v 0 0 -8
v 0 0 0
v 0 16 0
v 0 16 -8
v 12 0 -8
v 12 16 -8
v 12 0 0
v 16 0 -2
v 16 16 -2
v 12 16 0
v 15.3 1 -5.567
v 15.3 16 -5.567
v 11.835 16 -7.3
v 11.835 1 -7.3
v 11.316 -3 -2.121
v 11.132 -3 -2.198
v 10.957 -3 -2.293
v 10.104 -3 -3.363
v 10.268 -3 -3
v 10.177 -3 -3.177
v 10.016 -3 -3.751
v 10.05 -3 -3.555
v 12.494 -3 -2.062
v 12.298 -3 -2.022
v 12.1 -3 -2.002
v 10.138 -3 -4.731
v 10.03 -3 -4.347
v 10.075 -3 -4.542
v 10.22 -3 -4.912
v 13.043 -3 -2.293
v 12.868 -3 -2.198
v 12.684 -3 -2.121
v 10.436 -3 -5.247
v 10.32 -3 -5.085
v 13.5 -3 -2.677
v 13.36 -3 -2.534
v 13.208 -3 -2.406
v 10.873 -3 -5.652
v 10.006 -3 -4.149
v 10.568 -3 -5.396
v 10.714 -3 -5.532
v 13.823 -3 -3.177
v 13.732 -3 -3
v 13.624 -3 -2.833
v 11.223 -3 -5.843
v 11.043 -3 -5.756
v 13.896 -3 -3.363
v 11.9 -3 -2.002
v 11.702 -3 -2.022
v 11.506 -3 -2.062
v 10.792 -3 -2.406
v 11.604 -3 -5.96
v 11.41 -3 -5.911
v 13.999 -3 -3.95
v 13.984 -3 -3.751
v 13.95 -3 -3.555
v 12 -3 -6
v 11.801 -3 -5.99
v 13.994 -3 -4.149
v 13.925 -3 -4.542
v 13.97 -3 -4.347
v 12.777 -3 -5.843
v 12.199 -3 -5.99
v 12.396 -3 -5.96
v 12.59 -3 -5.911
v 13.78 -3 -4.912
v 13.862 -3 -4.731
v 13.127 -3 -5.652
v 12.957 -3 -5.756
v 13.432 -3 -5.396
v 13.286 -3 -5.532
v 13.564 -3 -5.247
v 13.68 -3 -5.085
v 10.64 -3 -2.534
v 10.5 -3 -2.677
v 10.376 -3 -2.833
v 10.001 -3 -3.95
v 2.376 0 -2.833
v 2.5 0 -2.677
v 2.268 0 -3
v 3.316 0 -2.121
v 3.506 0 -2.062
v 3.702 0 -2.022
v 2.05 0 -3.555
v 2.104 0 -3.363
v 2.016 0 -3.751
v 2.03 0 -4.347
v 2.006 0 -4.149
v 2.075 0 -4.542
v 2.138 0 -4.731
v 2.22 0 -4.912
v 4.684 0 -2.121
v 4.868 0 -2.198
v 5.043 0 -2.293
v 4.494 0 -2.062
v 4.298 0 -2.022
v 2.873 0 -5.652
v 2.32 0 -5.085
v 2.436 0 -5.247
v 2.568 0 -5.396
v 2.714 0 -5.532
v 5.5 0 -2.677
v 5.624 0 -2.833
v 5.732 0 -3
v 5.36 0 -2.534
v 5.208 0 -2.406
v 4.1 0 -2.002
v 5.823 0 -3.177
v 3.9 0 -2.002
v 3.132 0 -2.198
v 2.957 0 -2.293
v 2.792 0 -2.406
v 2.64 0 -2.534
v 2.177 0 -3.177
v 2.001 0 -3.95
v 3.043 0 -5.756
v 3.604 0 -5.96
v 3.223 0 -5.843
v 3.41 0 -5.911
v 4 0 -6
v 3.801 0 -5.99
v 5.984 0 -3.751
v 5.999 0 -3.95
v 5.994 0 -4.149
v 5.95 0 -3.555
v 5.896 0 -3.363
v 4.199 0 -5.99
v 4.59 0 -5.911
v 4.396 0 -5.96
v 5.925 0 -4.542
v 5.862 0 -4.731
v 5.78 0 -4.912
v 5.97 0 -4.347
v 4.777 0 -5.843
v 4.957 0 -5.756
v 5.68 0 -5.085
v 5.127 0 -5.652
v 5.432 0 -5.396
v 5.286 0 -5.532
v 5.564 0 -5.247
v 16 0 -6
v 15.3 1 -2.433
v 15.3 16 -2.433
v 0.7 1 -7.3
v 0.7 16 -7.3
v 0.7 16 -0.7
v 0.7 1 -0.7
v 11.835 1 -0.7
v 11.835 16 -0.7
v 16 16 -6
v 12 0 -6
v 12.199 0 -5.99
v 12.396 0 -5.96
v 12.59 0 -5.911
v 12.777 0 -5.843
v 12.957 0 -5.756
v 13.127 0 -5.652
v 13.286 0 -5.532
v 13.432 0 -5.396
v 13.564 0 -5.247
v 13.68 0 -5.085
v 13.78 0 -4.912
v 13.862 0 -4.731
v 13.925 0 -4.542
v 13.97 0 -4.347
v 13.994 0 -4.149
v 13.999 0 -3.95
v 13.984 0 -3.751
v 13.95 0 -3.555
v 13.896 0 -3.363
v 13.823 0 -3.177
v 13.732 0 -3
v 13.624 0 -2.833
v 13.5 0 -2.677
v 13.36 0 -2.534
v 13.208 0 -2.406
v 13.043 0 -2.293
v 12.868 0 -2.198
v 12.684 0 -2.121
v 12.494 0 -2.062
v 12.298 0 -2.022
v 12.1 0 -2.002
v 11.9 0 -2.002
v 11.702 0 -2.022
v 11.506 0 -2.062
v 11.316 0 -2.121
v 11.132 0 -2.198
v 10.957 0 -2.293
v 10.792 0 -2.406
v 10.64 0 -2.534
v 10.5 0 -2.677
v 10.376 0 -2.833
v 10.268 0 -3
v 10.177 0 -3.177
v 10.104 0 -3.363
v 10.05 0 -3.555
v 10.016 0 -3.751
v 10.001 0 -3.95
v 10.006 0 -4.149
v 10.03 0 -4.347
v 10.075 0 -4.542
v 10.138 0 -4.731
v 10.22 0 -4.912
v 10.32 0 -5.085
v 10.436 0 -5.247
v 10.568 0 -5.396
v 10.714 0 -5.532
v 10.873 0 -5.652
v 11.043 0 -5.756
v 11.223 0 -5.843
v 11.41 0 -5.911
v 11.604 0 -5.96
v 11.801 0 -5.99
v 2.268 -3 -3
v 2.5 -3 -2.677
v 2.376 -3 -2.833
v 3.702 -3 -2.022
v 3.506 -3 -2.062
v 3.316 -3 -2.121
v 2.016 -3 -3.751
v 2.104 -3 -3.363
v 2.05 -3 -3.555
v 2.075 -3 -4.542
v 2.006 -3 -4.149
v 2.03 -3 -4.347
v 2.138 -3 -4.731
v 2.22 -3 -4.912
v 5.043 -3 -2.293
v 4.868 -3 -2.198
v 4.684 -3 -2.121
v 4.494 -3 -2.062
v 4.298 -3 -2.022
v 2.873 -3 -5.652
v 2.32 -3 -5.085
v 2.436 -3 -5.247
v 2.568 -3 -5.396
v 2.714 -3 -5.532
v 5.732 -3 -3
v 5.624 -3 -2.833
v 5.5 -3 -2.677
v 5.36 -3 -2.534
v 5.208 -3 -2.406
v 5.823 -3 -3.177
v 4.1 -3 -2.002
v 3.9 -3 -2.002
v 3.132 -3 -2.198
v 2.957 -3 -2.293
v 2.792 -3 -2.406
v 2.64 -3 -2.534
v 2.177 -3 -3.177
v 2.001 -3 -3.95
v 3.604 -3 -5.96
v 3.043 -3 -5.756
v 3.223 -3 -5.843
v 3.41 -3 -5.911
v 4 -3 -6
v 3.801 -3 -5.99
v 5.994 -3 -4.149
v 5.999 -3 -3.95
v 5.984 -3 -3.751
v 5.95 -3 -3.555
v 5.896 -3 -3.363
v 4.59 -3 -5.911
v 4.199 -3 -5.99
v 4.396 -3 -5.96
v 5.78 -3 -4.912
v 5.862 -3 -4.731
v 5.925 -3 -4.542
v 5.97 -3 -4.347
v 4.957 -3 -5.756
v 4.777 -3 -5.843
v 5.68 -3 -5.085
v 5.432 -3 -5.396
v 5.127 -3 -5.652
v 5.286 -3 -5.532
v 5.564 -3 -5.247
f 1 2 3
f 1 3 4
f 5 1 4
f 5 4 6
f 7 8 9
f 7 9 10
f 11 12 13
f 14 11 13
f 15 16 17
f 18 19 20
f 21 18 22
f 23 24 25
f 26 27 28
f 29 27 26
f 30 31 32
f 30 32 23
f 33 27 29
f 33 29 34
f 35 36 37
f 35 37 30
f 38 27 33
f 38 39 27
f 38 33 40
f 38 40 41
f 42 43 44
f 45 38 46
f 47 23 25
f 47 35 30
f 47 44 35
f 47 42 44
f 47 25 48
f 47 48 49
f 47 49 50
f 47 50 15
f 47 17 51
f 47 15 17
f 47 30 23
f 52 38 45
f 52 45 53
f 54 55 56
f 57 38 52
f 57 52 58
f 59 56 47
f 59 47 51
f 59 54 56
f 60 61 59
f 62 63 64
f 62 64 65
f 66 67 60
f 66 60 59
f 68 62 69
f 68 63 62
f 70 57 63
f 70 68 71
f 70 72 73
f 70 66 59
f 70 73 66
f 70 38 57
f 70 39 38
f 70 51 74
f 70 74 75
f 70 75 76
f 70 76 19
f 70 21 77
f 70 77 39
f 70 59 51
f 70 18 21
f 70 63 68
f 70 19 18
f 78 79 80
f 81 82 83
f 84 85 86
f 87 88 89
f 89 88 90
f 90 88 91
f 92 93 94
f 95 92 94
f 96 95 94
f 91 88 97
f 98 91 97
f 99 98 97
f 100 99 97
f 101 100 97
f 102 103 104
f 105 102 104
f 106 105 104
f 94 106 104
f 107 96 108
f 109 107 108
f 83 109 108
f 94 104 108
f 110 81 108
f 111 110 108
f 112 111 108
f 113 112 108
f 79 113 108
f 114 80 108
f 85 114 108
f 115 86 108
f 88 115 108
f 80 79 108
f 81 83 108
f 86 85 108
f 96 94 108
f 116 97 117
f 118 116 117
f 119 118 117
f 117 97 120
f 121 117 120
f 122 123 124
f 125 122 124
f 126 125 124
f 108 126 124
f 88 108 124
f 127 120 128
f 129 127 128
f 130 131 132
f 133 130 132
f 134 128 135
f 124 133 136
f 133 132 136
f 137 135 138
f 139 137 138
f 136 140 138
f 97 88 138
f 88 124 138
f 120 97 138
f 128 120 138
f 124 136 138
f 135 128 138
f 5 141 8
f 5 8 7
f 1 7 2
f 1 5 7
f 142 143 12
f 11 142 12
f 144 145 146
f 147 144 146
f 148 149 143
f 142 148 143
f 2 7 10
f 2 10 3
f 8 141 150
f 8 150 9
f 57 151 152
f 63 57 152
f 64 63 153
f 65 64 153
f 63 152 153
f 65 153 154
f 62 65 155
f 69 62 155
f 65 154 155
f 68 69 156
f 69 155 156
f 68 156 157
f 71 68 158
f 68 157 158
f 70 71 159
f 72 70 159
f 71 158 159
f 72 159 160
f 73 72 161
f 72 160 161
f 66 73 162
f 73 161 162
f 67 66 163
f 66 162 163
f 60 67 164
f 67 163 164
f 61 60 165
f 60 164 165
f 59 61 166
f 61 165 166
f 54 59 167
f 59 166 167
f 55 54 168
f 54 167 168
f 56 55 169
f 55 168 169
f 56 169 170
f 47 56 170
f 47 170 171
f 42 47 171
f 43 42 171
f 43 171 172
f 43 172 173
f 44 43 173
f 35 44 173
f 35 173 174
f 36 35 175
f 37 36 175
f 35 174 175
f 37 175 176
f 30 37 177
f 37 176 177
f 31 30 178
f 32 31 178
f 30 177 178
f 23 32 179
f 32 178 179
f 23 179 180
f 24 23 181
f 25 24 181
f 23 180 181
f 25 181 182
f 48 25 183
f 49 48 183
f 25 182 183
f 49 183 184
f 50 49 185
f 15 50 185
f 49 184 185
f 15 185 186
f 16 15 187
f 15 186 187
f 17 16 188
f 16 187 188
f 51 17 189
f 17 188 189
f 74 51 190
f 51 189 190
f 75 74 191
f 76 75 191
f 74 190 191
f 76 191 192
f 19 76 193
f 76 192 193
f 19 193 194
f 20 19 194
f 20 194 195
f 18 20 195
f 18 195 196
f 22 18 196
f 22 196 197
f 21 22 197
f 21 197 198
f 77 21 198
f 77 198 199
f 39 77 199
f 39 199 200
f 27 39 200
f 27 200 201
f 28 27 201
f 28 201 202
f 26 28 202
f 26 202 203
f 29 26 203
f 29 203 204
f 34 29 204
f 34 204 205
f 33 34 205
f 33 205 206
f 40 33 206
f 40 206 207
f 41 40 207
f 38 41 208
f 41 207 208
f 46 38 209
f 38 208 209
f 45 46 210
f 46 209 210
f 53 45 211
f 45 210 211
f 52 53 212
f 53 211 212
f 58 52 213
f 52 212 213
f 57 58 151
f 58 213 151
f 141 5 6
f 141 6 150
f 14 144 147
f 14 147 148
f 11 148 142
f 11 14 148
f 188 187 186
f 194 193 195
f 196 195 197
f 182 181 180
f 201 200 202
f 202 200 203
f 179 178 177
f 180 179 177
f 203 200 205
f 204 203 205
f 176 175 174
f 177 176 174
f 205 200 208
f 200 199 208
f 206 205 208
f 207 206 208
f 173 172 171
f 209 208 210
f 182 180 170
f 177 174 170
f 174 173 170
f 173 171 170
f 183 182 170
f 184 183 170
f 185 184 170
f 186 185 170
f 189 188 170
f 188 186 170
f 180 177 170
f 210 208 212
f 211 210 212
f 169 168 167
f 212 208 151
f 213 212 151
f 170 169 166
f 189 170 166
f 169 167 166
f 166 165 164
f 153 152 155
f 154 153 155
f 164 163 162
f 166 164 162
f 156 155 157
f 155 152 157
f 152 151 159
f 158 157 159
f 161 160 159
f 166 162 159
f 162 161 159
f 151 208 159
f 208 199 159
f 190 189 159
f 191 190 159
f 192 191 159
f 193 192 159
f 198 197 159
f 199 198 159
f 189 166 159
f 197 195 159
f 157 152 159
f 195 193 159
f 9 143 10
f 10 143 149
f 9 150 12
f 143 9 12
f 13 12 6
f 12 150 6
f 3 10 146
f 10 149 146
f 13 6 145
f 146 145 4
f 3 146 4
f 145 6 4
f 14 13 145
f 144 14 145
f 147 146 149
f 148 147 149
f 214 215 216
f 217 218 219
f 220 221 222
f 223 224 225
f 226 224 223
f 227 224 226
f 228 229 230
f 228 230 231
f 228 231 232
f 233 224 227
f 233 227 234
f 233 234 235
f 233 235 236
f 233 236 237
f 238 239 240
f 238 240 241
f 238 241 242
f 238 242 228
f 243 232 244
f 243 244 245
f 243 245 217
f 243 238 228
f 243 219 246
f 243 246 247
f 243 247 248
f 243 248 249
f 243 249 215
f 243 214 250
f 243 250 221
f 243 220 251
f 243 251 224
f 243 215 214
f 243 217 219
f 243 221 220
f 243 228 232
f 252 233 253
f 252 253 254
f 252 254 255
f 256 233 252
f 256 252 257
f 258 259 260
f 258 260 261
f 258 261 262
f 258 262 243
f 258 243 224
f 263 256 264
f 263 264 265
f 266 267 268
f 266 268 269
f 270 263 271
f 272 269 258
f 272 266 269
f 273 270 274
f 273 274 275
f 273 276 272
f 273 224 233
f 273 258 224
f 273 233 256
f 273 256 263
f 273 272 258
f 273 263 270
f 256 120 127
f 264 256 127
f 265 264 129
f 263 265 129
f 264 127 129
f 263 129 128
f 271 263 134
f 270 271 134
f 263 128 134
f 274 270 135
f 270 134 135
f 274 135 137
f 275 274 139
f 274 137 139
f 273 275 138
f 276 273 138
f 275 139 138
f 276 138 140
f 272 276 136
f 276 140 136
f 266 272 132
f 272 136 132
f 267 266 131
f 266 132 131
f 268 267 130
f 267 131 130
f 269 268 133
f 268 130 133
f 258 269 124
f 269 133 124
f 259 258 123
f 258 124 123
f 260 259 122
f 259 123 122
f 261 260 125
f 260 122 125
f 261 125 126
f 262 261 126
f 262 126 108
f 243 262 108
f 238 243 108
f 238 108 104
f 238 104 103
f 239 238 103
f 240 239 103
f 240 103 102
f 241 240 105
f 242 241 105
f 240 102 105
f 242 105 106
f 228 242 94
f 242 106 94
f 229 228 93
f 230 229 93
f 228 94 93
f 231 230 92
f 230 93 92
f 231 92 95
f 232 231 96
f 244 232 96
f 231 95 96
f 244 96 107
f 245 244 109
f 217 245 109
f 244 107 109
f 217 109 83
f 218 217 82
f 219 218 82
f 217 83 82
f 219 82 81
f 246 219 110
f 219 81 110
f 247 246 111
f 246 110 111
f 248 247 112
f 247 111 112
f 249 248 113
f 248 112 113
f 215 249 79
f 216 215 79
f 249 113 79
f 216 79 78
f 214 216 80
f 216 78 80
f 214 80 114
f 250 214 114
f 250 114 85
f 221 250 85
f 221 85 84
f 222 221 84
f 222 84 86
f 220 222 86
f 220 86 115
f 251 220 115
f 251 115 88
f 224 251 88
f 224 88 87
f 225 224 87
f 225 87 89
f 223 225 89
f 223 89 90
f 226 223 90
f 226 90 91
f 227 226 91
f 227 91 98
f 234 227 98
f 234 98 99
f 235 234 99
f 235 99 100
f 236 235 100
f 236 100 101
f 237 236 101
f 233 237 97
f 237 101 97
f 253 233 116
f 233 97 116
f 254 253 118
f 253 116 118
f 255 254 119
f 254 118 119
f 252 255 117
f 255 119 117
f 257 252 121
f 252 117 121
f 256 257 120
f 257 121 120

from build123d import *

# Parameters (mm, degrees)
SALIENTE_EXTRUIR1_DEPTH   = 16
CORTAR_EXTRUIR1_DEPTH     = 15
CROQUIS3_R                = 2
SALIENTE_EXTRUIR2_DEPTH   = 3
SALIENTE_EXTRUIR2_2_DEPTH = 3


with BuildPart() as part:
    # Croquis1 → Saliente-Extruir1 (new body)
    with BuildSketch(Plane(origin=(0, 0, 0), x_dir=(1, 0, 0), z_dir=(0, 1, 0))):
        Polygon((0, 0), (0, 8), (12, 8), (16, 6), (16, 2), (12, 0), align=None)
    extrude(amount=SALIENTE_EXTRUIR1_DEPTH)

    # Croquis2 → Cortar-Extruir1 (cut)
    with BuildSketch(Plane(origin=(0, 16, 0), x_dir=(1, 0, 0), z_dir=(0, 1, 0))):
        Polygon((11.834752416, 0.7), (15.3, 2.432623792), (15.3, 5.567376208), (11.834752416, 7.3), (0.7, 7.3), (0.7, 0.7), align=None)
    extrude(amount=-CORTAR_EXTRUIR1_DEPTH, mode=Mode.SUBTRACT)


with BuildPart() as body_2:
    # Croquis3 → Saliente-Extruir2 (new body)
    with BuildSketch(Plane.XZ):
        with Locations(Location((4, -4, 0), (0, 0, 270))):
            Circle(CROQUIS3_R)
    extrude(amount=SALIENTE_EXTRUIR2_DEPTH)


with BuildPart() as body_3:
    # Croquis3 → Saliente-Extruir2 2 (new body)
    with BuildSketch(Plane.XZ):
        with Locations(Location((12, -4, 0), (0, 0, 270))):
            Circle(CROQUIS3_R)
    extrude(amount=SALIENTE_EXTRUIR2_2_DEPTH)


solid = Compound([part.part, body_2.part, body_3.part])
